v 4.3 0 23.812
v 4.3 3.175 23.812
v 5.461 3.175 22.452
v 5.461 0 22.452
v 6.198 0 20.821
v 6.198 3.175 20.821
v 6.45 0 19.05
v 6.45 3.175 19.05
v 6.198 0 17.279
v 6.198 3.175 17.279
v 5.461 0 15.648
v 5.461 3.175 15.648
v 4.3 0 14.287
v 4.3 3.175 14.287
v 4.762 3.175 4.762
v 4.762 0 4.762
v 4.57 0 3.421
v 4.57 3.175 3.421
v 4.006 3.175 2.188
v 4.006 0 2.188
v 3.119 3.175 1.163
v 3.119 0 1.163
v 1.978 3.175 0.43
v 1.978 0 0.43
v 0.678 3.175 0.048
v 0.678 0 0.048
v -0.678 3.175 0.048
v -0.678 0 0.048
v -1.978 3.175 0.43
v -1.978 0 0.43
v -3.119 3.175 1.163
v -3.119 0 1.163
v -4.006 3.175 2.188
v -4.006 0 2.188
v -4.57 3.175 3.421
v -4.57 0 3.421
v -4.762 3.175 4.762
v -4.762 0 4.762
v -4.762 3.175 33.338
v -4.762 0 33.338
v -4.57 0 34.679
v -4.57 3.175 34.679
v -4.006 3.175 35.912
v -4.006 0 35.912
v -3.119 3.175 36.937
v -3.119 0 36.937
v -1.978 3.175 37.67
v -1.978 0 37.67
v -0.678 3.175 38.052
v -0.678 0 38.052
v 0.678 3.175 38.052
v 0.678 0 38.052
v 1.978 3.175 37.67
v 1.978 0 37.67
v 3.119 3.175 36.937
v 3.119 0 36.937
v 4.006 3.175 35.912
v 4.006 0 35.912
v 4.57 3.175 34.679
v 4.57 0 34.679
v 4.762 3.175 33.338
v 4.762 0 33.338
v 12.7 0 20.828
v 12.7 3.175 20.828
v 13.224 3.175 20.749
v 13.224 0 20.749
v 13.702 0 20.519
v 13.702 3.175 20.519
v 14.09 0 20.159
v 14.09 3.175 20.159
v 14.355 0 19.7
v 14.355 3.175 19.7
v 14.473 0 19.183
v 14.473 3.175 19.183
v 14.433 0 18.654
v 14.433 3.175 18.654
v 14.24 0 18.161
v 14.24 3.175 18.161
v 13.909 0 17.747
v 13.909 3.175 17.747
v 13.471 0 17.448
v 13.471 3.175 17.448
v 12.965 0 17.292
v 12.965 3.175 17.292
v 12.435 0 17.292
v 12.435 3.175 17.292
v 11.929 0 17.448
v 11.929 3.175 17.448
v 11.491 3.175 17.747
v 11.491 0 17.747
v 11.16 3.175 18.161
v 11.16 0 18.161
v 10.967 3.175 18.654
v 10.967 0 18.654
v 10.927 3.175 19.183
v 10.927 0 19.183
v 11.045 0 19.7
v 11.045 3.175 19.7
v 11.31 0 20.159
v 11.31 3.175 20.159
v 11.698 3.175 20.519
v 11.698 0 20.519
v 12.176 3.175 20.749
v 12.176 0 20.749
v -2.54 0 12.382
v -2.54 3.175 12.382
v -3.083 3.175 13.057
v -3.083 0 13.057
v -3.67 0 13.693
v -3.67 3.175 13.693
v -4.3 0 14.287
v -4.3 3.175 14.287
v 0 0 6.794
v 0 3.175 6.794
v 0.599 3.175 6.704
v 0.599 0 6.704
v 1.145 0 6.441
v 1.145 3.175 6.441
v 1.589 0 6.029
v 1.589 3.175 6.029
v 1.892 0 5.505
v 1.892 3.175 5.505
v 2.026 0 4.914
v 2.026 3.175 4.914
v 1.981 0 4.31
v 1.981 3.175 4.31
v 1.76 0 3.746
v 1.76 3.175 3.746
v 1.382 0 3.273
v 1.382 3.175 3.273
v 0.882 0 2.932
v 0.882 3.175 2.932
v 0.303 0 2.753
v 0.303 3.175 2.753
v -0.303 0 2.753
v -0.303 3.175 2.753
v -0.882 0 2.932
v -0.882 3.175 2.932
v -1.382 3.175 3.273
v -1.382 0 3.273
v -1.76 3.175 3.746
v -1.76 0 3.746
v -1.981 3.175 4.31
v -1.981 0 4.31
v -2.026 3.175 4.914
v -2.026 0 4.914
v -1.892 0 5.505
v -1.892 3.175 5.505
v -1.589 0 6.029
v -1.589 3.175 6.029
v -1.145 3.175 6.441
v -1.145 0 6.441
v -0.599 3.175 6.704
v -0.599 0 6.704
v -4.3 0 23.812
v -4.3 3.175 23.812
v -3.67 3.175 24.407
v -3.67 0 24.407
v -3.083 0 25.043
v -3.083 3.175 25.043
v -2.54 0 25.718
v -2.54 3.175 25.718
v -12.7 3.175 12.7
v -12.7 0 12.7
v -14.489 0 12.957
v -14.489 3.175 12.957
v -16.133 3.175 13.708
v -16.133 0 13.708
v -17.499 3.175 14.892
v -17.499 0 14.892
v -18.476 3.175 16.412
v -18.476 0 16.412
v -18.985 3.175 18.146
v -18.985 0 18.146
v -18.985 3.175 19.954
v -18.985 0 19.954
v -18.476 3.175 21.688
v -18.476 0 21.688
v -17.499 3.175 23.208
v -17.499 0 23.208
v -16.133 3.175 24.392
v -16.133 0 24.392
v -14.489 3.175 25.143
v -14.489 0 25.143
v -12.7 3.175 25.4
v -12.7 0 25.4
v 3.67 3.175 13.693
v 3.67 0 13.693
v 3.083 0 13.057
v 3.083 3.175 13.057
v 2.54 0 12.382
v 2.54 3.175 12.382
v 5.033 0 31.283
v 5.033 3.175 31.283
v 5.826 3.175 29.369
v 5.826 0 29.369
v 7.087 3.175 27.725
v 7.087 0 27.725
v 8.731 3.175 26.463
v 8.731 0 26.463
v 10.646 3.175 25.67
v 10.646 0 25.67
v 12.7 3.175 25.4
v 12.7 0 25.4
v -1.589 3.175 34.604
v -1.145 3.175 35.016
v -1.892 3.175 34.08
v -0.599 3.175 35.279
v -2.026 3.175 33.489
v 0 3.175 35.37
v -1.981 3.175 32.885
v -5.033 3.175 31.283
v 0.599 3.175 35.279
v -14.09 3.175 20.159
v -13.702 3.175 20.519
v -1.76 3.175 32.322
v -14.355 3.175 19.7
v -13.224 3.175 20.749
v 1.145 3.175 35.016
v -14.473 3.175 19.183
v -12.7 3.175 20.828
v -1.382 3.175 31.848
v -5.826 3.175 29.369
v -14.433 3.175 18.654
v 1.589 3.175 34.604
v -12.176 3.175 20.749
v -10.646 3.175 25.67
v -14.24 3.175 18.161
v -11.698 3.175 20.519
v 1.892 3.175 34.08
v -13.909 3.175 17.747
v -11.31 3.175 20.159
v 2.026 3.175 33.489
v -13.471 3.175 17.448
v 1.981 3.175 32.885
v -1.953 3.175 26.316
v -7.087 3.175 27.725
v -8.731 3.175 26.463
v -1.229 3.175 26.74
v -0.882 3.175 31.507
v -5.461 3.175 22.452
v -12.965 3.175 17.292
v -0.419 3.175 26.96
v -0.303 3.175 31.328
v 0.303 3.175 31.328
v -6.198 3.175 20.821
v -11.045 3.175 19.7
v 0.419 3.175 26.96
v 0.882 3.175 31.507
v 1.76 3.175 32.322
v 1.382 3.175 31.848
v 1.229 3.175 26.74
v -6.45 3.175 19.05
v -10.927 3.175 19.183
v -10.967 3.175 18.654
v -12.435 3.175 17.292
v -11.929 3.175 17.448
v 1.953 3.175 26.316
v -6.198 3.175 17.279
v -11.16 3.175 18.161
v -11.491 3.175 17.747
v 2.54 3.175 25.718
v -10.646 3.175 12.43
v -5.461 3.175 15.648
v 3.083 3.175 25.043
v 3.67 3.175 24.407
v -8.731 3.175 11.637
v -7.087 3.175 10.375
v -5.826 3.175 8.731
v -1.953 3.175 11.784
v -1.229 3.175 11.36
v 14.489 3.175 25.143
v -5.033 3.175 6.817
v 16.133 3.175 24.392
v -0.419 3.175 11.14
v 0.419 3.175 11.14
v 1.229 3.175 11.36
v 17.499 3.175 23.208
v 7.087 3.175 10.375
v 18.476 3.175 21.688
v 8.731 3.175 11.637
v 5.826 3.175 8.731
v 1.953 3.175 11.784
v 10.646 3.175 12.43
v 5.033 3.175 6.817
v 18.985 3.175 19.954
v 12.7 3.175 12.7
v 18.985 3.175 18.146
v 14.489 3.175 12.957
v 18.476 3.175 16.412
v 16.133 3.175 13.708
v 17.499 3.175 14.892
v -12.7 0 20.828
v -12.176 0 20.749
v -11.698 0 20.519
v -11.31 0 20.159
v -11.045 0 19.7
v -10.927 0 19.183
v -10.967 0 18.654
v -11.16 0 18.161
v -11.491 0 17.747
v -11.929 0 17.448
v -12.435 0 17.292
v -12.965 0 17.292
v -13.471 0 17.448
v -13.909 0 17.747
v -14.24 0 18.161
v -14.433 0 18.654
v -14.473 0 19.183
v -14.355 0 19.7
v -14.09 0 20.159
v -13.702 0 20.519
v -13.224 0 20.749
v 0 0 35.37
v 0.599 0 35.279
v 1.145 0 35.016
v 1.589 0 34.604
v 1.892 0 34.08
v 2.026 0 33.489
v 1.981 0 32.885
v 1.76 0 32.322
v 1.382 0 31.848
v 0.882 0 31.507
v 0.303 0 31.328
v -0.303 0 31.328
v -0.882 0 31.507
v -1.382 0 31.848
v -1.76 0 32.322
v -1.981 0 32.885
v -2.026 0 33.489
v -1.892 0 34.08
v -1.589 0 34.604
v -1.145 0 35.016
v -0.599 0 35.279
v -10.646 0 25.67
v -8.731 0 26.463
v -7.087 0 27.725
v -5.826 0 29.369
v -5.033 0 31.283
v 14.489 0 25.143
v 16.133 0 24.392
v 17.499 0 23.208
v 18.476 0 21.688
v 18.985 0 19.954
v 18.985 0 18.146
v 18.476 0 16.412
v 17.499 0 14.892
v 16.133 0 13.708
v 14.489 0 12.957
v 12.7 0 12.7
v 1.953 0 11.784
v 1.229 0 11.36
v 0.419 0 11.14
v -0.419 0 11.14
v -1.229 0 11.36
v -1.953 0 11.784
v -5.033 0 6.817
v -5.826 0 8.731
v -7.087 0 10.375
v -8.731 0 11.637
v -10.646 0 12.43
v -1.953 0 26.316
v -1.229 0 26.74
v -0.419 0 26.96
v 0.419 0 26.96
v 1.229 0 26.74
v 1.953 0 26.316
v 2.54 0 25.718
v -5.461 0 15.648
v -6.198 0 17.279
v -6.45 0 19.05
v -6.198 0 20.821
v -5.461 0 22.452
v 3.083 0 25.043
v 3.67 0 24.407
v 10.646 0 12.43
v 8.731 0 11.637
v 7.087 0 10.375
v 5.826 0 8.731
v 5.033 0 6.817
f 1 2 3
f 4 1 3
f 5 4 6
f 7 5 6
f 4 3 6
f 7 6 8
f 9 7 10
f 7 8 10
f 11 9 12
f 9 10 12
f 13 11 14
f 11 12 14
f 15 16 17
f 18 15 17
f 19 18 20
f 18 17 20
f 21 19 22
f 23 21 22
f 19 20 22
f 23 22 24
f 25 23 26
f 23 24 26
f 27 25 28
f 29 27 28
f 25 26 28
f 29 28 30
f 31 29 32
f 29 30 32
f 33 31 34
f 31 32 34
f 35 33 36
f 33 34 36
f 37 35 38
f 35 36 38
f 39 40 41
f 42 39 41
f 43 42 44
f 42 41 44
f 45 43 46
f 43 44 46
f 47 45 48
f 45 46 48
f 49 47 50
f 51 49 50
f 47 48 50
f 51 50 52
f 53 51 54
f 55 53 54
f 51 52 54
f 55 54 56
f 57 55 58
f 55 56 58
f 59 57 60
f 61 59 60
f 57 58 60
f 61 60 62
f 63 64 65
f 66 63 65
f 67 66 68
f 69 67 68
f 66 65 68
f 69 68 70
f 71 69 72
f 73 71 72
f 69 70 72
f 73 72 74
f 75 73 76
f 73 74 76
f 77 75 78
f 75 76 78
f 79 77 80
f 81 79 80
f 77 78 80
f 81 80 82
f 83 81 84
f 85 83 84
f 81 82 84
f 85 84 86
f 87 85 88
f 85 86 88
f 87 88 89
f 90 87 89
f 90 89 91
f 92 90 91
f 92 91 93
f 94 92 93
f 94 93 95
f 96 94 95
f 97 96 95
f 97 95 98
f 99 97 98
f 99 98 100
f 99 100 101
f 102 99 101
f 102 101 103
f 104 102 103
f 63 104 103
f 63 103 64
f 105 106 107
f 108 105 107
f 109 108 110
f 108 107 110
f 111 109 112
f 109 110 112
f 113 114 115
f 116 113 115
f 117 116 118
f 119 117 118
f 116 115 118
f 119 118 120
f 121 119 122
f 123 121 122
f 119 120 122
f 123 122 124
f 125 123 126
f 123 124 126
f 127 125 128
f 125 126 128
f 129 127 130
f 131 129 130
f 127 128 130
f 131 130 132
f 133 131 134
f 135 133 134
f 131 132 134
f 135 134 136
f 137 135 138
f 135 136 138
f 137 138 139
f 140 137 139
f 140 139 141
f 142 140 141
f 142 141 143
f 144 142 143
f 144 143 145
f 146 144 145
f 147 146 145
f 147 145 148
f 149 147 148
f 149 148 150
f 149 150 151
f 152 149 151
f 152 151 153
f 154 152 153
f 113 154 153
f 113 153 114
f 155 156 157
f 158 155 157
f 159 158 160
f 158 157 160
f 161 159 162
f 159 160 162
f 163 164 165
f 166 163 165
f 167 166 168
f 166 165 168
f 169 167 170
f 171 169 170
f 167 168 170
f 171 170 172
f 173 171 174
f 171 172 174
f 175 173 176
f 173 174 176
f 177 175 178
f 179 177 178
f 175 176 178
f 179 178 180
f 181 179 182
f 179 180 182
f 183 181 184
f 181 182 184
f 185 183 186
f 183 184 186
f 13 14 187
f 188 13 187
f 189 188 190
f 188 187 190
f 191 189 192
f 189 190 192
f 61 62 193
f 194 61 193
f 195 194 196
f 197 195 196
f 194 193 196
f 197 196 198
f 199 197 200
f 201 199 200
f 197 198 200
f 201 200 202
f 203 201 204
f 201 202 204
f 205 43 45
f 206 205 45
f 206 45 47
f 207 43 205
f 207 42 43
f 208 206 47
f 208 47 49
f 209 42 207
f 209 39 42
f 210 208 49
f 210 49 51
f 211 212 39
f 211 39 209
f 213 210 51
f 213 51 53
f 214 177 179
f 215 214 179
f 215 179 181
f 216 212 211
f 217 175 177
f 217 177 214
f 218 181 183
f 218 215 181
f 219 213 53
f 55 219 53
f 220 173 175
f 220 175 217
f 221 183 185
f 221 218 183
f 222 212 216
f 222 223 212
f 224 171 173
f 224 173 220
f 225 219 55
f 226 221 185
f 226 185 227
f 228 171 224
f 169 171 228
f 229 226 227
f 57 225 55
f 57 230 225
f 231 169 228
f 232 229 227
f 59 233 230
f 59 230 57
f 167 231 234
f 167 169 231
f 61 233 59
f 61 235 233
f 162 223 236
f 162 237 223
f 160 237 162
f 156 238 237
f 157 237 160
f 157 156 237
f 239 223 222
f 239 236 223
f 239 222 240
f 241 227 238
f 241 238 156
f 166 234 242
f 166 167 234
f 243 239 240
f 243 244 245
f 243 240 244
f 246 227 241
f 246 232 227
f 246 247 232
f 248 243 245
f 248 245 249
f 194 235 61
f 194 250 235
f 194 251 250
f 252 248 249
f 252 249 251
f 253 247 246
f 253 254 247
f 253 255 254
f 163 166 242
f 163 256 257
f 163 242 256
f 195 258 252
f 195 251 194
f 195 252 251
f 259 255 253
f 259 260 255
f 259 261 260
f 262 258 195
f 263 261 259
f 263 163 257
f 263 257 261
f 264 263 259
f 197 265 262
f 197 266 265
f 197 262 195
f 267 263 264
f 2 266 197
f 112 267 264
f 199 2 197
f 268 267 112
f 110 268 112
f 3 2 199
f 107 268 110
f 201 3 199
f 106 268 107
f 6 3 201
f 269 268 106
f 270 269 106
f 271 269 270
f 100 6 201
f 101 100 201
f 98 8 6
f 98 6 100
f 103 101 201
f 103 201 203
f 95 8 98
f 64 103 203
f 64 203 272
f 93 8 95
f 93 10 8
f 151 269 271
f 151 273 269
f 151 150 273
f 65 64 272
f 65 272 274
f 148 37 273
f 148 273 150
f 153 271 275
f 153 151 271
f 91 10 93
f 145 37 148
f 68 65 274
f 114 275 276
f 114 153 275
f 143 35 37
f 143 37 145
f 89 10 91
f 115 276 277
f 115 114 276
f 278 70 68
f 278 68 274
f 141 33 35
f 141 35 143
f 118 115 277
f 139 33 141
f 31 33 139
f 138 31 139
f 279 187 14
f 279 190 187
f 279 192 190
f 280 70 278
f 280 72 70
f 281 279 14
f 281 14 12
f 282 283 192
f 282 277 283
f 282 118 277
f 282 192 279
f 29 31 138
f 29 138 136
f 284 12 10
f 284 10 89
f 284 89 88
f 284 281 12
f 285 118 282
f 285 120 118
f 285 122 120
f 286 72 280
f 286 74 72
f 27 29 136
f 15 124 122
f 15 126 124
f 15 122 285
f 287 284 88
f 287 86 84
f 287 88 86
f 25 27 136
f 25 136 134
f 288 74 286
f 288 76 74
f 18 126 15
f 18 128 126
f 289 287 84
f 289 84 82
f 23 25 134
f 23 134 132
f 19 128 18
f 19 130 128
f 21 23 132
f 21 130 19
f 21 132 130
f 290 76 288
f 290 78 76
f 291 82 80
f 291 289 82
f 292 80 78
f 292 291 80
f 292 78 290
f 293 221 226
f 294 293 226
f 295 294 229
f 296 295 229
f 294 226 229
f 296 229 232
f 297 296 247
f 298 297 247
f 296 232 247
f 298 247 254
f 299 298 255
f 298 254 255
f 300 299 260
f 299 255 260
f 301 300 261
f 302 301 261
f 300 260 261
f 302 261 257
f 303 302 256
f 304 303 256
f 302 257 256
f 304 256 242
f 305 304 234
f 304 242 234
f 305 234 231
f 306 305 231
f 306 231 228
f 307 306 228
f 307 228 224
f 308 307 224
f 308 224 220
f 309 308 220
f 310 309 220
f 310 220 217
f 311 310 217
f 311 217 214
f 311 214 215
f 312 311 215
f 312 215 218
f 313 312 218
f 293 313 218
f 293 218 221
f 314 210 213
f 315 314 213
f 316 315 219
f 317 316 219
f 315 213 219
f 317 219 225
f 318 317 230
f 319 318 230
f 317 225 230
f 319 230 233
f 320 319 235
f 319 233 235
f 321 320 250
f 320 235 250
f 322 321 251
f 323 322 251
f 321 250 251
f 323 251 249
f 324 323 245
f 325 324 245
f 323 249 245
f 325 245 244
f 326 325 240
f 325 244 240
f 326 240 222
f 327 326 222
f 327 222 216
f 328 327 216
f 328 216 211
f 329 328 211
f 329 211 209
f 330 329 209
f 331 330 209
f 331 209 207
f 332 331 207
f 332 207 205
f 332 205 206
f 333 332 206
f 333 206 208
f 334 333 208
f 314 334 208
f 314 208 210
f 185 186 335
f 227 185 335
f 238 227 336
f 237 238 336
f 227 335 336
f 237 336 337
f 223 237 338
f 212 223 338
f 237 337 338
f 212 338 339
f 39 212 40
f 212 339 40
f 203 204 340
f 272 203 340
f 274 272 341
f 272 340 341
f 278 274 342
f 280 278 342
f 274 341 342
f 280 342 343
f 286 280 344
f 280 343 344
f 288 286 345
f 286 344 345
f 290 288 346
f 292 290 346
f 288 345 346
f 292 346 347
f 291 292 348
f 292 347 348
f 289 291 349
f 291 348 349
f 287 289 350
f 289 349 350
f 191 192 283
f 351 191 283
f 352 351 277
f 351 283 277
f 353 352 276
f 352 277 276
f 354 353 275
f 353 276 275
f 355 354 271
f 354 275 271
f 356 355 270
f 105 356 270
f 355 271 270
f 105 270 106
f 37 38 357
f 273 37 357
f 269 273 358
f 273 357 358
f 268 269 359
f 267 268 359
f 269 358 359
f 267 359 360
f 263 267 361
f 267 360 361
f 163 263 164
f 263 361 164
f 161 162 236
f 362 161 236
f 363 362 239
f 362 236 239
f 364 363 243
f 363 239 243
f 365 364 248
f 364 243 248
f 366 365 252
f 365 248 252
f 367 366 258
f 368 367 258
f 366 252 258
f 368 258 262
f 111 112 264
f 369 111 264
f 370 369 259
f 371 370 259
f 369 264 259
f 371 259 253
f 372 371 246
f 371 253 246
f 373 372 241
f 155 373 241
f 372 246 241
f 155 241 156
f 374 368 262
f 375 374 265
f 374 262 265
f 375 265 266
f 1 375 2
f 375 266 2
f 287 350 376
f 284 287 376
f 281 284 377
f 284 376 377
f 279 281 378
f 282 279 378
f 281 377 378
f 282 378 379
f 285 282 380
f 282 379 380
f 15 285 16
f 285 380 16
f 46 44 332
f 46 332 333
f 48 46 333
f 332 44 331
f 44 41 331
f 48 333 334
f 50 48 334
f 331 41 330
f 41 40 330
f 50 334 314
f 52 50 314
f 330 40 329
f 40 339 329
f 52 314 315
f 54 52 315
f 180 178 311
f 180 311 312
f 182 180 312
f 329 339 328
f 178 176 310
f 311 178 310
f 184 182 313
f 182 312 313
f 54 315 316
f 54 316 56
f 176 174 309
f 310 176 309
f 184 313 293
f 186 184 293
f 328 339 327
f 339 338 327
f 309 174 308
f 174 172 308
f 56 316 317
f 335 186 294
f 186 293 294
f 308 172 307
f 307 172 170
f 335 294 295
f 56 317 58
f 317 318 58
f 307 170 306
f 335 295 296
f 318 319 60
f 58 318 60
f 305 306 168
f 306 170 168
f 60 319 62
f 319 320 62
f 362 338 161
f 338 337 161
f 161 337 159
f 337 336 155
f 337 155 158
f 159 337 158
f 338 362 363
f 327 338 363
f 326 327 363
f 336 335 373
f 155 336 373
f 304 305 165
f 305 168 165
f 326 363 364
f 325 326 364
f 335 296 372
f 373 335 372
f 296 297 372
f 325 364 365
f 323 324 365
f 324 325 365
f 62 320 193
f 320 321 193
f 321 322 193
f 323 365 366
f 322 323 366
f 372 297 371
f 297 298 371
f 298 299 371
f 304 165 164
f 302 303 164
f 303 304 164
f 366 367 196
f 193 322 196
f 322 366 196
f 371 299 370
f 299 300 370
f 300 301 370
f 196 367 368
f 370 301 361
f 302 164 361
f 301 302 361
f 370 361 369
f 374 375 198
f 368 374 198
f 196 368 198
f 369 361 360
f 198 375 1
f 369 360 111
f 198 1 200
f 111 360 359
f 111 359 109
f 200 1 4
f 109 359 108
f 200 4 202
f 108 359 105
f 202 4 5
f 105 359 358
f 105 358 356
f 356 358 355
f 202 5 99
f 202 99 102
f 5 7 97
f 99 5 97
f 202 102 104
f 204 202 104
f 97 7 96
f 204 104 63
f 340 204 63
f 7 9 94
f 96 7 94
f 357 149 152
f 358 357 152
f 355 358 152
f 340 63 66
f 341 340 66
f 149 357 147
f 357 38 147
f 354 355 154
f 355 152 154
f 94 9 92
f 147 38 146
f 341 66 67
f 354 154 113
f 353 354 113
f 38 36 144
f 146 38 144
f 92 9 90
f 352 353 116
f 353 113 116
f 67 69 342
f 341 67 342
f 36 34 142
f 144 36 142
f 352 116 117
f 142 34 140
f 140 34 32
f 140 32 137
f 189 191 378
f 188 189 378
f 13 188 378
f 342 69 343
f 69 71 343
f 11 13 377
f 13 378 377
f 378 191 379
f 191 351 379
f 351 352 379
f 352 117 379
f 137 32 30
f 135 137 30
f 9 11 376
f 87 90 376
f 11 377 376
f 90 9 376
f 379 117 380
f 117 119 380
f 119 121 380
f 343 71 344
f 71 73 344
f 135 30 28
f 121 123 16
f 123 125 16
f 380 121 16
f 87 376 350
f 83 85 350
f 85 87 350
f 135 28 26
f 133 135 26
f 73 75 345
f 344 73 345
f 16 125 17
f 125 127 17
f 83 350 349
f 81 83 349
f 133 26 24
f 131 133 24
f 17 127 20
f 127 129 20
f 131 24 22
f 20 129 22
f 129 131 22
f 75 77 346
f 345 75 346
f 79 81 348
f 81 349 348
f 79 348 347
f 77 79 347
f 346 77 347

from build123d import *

# Parameters (mm, degrees)
BOSS_EXTRUDE1_DEPTH = 3.175254
SKETCH2_R           = 2.032
SKETCH2_R_2         = 1.778
CUT_EXTRUDE1_DEPTH  = 43.71527523
CUT_EXTRUDE2_DEPTH  = 43.71527523


with BuildPart() as part:
    # Sketch1 → Boss-Extrude1 (new body)
    with BuildSketch(Plane(origin=(0, 0, 0), x_dir=(1, 0, 0), z_dir=(0, 1, 0))):
        with BuildLine():
            ThreePointArc((4.7625, -4.7625), (0, 0), (-4.7625, -4.7625))
            ThreePointArc((-4.7625, -4.7625), (-7.087339924, -10.375160076), (-12.7, -12.7))
            ThreePointArc((-12.7, -12.7), (-19.05, -19.05), (-12.7, -25.4))
            ThreePointArc((-12.7, -25.4), (-7.087339924, -27.724839924), (-4.7625, -33.3375))
            ThreePointArc((-4.7625, -33.3375), (0, -38.1), (4.7625, -33.3375))
            ThreePointArc((4.7625, -33.3375), (7.087339924, -27.724839924), (12.7, -25.4))
            ThreePointArc((12.7, -25.4), (19.05, -19.05), (12.7, -12.7))
            ThreePointArc((12.7, -12.7), (7.087339924, -10.375160076), (4.7625, -4.7625))
        make_face()
    extrude(amount=BOSS_EXTRUDE1_DEPTH)

    # Sketch2 → Cut-Extrude1 (cut, through all)
    with BuildSketch(Plane(origin=(0, 3.175254, 0), x_dir=(1, 0, 0), z_dir=(0, 1, 0))):
        with Locations(Location((0, -4.7625, 0), (0, 0, 270))):
            Circle(SKETCH2_R)
        with Locations(Location((12.7, -19.05, 0), (0, 0, 270))):
            Circle(SKETCH2_R_2)
        with Locations(Location((0, -33.3375, 0), (0, 0, 270))):
            Circle(SKETCH2_R)
        with Locations(Location((-12.7, -19.05, 0), (0, 0, 270))):
            Circle(SKETCH2_R_2)
    extrude(amount=-CUT_EXTRUDE1_DEPTH, mode=Mode.SUBTRACT)

    # Sketch3 → Cut-Extrude2 (cut, through all)
    with BuildSketch(Plane(origin=(0, 3.175254, 0), x_dir=(1, 0, 0), z_dir=(0, 1, 0))):
        with BuildLine():
            ThreePointArc((-4.299739587, -14.2875), (-6.449609381, -19.05), (-4.299739587, -23.8125))
            ThreePointArc((-4.299739587, -23.8125), (-3.371116203, -24.719963977), (-2.54, -25.7175))
            ThreePointArc((-2.54, -25.7175), (0, -26.9875), (2.54, -25.7175))
            ThreePointArc((2.54, -25.7175), (3.371116203, -24.719963977), (4.299739587, -23.8125))
            ThreePointArc((4.299739587, -23.8125), (6.449609381, -19.05), (4.299739587, -14.2875))
            ThreePointArc((4.299739587, -14.2875), (3.371116203, -13.380036023), (2.54, -12.3825))
            ThreePointArc((2.54, -12.3825), (0, -11.1125), (-2.54, -12.3825))
            ThreePointArc((-2.54, -12.3825), (-3.371116203, -13.380036023), (-4.299739587, -14.2875))
        make_face()
    extrude(amount=-CUT_EXTRUDE2_DEPTH, mode=Mode.SUBTRACT)


solid = part.part
